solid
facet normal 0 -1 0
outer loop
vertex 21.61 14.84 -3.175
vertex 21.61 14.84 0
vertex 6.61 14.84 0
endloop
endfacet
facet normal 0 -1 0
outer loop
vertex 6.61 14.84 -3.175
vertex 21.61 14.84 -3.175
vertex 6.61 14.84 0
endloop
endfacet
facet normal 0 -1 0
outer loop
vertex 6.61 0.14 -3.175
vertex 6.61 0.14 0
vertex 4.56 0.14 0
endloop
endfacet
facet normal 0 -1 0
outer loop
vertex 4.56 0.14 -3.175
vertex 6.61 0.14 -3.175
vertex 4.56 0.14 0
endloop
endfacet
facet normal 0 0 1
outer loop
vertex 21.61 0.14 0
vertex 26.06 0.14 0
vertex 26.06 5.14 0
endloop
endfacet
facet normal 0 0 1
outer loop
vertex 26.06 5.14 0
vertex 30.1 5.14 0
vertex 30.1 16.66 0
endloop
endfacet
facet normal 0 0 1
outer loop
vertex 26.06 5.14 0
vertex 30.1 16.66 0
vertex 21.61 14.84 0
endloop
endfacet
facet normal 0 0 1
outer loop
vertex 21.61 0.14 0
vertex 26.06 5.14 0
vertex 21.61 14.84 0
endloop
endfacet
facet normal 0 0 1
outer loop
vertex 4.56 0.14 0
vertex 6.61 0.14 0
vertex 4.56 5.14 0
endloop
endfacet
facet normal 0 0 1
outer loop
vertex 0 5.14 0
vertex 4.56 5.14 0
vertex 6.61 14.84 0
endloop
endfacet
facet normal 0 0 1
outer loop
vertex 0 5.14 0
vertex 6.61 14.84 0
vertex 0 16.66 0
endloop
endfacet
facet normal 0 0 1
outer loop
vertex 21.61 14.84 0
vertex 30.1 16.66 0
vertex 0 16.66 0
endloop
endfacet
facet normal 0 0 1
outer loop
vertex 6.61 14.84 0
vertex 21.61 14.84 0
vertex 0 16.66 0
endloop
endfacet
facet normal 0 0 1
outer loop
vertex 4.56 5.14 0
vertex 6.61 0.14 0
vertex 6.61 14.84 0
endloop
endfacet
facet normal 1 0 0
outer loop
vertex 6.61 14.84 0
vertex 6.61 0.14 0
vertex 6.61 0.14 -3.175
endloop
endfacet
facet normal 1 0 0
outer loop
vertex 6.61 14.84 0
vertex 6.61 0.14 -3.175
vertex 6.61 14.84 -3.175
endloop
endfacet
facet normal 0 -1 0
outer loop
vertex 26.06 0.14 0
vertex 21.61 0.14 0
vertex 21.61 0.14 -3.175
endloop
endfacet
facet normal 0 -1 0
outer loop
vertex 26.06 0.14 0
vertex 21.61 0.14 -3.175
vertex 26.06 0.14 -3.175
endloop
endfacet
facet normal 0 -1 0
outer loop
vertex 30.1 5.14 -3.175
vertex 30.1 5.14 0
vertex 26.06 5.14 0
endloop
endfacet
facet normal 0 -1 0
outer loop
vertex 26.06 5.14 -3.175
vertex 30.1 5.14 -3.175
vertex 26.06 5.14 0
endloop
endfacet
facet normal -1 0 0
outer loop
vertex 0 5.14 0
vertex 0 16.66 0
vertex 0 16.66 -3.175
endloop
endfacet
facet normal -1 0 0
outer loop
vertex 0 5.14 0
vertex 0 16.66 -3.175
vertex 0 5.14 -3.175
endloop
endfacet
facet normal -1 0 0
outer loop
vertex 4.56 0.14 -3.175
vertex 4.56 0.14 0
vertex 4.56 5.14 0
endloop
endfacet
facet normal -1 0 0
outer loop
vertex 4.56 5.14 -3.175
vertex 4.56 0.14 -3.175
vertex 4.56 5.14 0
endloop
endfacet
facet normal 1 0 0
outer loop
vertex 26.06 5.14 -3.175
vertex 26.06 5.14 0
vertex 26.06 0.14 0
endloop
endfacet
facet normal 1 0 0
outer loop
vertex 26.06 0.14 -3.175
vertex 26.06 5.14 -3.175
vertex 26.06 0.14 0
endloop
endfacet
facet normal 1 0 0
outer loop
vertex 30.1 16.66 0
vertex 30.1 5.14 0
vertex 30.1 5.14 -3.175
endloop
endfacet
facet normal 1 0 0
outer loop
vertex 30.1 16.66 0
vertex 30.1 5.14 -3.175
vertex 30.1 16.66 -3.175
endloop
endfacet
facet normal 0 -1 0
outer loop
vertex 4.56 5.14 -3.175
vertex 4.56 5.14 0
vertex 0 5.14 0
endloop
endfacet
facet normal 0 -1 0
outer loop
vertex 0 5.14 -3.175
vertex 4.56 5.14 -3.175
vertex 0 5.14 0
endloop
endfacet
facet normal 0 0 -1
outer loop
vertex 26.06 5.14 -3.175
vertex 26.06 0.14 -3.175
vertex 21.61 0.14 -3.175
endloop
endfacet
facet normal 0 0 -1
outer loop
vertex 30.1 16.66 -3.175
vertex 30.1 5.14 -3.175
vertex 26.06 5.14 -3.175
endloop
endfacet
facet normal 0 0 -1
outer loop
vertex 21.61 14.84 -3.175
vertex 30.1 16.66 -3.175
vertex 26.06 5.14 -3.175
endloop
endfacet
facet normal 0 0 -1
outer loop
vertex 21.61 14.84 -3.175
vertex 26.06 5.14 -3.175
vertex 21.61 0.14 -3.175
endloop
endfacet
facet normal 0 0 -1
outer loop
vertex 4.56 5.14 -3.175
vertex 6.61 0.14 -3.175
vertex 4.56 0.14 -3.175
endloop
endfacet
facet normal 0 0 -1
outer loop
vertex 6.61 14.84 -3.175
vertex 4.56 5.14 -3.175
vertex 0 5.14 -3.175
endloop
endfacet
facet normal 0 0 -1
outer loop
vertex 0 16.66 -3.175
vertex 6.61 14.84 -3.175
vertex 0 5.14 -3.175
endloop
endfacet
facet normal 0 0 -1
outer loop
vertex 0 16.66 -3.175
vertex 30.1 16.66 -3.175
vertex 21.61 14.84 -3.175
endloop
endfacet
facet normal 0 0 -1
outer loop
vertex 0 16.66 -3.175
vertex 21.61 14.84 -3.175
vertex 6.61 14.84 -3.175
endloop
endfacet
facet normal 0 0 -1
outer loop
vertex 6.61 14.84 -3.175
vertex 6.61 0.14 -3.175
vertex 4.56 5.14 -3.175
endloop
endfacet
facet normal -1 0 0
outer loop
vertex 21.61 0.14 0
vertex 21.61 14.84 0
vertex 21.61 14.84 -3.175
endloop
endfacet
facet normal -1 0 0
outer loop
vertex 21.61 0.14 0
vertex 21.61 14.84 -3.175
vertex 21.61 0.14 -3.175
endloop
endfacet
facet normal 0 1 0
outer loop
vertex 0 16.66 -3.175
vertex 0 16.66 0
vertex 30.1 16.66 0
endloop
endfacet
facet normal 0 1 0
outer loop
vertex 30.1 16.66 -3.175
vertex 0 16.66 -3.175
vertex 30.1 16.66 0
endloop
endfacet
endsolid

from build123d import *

# Parameters (mm, degrees)
BOSS_EXTRUDE1_DEPTH = 3.175


with BuildPart() as part:
    # Sketch1 → Boss-Extrude1 (new body)
    with BuildSketch(Plane.XY):
        Polygon((0, 16.66), (30.1, 16.66), (30.1, 6.34), (30.1, 5.14), (26.06, 5.14), (26.06, 0.14), (25.36, 0.14), (21.61, 0.14), (21.61, 5.14), (21.61, 6.34), (21.61, 14.84), (6.61, 14.84), (6.61, 6.34), (6.61, 5.14), (6.61, 0.14), (4.559999976, 0.14), (4.559999976, 5.14), (0, 5.14), (0, 6.34), align=None)
    extrude(amount=-BOSS_EXTRUDE1_DEPTH)


solid = part.part
